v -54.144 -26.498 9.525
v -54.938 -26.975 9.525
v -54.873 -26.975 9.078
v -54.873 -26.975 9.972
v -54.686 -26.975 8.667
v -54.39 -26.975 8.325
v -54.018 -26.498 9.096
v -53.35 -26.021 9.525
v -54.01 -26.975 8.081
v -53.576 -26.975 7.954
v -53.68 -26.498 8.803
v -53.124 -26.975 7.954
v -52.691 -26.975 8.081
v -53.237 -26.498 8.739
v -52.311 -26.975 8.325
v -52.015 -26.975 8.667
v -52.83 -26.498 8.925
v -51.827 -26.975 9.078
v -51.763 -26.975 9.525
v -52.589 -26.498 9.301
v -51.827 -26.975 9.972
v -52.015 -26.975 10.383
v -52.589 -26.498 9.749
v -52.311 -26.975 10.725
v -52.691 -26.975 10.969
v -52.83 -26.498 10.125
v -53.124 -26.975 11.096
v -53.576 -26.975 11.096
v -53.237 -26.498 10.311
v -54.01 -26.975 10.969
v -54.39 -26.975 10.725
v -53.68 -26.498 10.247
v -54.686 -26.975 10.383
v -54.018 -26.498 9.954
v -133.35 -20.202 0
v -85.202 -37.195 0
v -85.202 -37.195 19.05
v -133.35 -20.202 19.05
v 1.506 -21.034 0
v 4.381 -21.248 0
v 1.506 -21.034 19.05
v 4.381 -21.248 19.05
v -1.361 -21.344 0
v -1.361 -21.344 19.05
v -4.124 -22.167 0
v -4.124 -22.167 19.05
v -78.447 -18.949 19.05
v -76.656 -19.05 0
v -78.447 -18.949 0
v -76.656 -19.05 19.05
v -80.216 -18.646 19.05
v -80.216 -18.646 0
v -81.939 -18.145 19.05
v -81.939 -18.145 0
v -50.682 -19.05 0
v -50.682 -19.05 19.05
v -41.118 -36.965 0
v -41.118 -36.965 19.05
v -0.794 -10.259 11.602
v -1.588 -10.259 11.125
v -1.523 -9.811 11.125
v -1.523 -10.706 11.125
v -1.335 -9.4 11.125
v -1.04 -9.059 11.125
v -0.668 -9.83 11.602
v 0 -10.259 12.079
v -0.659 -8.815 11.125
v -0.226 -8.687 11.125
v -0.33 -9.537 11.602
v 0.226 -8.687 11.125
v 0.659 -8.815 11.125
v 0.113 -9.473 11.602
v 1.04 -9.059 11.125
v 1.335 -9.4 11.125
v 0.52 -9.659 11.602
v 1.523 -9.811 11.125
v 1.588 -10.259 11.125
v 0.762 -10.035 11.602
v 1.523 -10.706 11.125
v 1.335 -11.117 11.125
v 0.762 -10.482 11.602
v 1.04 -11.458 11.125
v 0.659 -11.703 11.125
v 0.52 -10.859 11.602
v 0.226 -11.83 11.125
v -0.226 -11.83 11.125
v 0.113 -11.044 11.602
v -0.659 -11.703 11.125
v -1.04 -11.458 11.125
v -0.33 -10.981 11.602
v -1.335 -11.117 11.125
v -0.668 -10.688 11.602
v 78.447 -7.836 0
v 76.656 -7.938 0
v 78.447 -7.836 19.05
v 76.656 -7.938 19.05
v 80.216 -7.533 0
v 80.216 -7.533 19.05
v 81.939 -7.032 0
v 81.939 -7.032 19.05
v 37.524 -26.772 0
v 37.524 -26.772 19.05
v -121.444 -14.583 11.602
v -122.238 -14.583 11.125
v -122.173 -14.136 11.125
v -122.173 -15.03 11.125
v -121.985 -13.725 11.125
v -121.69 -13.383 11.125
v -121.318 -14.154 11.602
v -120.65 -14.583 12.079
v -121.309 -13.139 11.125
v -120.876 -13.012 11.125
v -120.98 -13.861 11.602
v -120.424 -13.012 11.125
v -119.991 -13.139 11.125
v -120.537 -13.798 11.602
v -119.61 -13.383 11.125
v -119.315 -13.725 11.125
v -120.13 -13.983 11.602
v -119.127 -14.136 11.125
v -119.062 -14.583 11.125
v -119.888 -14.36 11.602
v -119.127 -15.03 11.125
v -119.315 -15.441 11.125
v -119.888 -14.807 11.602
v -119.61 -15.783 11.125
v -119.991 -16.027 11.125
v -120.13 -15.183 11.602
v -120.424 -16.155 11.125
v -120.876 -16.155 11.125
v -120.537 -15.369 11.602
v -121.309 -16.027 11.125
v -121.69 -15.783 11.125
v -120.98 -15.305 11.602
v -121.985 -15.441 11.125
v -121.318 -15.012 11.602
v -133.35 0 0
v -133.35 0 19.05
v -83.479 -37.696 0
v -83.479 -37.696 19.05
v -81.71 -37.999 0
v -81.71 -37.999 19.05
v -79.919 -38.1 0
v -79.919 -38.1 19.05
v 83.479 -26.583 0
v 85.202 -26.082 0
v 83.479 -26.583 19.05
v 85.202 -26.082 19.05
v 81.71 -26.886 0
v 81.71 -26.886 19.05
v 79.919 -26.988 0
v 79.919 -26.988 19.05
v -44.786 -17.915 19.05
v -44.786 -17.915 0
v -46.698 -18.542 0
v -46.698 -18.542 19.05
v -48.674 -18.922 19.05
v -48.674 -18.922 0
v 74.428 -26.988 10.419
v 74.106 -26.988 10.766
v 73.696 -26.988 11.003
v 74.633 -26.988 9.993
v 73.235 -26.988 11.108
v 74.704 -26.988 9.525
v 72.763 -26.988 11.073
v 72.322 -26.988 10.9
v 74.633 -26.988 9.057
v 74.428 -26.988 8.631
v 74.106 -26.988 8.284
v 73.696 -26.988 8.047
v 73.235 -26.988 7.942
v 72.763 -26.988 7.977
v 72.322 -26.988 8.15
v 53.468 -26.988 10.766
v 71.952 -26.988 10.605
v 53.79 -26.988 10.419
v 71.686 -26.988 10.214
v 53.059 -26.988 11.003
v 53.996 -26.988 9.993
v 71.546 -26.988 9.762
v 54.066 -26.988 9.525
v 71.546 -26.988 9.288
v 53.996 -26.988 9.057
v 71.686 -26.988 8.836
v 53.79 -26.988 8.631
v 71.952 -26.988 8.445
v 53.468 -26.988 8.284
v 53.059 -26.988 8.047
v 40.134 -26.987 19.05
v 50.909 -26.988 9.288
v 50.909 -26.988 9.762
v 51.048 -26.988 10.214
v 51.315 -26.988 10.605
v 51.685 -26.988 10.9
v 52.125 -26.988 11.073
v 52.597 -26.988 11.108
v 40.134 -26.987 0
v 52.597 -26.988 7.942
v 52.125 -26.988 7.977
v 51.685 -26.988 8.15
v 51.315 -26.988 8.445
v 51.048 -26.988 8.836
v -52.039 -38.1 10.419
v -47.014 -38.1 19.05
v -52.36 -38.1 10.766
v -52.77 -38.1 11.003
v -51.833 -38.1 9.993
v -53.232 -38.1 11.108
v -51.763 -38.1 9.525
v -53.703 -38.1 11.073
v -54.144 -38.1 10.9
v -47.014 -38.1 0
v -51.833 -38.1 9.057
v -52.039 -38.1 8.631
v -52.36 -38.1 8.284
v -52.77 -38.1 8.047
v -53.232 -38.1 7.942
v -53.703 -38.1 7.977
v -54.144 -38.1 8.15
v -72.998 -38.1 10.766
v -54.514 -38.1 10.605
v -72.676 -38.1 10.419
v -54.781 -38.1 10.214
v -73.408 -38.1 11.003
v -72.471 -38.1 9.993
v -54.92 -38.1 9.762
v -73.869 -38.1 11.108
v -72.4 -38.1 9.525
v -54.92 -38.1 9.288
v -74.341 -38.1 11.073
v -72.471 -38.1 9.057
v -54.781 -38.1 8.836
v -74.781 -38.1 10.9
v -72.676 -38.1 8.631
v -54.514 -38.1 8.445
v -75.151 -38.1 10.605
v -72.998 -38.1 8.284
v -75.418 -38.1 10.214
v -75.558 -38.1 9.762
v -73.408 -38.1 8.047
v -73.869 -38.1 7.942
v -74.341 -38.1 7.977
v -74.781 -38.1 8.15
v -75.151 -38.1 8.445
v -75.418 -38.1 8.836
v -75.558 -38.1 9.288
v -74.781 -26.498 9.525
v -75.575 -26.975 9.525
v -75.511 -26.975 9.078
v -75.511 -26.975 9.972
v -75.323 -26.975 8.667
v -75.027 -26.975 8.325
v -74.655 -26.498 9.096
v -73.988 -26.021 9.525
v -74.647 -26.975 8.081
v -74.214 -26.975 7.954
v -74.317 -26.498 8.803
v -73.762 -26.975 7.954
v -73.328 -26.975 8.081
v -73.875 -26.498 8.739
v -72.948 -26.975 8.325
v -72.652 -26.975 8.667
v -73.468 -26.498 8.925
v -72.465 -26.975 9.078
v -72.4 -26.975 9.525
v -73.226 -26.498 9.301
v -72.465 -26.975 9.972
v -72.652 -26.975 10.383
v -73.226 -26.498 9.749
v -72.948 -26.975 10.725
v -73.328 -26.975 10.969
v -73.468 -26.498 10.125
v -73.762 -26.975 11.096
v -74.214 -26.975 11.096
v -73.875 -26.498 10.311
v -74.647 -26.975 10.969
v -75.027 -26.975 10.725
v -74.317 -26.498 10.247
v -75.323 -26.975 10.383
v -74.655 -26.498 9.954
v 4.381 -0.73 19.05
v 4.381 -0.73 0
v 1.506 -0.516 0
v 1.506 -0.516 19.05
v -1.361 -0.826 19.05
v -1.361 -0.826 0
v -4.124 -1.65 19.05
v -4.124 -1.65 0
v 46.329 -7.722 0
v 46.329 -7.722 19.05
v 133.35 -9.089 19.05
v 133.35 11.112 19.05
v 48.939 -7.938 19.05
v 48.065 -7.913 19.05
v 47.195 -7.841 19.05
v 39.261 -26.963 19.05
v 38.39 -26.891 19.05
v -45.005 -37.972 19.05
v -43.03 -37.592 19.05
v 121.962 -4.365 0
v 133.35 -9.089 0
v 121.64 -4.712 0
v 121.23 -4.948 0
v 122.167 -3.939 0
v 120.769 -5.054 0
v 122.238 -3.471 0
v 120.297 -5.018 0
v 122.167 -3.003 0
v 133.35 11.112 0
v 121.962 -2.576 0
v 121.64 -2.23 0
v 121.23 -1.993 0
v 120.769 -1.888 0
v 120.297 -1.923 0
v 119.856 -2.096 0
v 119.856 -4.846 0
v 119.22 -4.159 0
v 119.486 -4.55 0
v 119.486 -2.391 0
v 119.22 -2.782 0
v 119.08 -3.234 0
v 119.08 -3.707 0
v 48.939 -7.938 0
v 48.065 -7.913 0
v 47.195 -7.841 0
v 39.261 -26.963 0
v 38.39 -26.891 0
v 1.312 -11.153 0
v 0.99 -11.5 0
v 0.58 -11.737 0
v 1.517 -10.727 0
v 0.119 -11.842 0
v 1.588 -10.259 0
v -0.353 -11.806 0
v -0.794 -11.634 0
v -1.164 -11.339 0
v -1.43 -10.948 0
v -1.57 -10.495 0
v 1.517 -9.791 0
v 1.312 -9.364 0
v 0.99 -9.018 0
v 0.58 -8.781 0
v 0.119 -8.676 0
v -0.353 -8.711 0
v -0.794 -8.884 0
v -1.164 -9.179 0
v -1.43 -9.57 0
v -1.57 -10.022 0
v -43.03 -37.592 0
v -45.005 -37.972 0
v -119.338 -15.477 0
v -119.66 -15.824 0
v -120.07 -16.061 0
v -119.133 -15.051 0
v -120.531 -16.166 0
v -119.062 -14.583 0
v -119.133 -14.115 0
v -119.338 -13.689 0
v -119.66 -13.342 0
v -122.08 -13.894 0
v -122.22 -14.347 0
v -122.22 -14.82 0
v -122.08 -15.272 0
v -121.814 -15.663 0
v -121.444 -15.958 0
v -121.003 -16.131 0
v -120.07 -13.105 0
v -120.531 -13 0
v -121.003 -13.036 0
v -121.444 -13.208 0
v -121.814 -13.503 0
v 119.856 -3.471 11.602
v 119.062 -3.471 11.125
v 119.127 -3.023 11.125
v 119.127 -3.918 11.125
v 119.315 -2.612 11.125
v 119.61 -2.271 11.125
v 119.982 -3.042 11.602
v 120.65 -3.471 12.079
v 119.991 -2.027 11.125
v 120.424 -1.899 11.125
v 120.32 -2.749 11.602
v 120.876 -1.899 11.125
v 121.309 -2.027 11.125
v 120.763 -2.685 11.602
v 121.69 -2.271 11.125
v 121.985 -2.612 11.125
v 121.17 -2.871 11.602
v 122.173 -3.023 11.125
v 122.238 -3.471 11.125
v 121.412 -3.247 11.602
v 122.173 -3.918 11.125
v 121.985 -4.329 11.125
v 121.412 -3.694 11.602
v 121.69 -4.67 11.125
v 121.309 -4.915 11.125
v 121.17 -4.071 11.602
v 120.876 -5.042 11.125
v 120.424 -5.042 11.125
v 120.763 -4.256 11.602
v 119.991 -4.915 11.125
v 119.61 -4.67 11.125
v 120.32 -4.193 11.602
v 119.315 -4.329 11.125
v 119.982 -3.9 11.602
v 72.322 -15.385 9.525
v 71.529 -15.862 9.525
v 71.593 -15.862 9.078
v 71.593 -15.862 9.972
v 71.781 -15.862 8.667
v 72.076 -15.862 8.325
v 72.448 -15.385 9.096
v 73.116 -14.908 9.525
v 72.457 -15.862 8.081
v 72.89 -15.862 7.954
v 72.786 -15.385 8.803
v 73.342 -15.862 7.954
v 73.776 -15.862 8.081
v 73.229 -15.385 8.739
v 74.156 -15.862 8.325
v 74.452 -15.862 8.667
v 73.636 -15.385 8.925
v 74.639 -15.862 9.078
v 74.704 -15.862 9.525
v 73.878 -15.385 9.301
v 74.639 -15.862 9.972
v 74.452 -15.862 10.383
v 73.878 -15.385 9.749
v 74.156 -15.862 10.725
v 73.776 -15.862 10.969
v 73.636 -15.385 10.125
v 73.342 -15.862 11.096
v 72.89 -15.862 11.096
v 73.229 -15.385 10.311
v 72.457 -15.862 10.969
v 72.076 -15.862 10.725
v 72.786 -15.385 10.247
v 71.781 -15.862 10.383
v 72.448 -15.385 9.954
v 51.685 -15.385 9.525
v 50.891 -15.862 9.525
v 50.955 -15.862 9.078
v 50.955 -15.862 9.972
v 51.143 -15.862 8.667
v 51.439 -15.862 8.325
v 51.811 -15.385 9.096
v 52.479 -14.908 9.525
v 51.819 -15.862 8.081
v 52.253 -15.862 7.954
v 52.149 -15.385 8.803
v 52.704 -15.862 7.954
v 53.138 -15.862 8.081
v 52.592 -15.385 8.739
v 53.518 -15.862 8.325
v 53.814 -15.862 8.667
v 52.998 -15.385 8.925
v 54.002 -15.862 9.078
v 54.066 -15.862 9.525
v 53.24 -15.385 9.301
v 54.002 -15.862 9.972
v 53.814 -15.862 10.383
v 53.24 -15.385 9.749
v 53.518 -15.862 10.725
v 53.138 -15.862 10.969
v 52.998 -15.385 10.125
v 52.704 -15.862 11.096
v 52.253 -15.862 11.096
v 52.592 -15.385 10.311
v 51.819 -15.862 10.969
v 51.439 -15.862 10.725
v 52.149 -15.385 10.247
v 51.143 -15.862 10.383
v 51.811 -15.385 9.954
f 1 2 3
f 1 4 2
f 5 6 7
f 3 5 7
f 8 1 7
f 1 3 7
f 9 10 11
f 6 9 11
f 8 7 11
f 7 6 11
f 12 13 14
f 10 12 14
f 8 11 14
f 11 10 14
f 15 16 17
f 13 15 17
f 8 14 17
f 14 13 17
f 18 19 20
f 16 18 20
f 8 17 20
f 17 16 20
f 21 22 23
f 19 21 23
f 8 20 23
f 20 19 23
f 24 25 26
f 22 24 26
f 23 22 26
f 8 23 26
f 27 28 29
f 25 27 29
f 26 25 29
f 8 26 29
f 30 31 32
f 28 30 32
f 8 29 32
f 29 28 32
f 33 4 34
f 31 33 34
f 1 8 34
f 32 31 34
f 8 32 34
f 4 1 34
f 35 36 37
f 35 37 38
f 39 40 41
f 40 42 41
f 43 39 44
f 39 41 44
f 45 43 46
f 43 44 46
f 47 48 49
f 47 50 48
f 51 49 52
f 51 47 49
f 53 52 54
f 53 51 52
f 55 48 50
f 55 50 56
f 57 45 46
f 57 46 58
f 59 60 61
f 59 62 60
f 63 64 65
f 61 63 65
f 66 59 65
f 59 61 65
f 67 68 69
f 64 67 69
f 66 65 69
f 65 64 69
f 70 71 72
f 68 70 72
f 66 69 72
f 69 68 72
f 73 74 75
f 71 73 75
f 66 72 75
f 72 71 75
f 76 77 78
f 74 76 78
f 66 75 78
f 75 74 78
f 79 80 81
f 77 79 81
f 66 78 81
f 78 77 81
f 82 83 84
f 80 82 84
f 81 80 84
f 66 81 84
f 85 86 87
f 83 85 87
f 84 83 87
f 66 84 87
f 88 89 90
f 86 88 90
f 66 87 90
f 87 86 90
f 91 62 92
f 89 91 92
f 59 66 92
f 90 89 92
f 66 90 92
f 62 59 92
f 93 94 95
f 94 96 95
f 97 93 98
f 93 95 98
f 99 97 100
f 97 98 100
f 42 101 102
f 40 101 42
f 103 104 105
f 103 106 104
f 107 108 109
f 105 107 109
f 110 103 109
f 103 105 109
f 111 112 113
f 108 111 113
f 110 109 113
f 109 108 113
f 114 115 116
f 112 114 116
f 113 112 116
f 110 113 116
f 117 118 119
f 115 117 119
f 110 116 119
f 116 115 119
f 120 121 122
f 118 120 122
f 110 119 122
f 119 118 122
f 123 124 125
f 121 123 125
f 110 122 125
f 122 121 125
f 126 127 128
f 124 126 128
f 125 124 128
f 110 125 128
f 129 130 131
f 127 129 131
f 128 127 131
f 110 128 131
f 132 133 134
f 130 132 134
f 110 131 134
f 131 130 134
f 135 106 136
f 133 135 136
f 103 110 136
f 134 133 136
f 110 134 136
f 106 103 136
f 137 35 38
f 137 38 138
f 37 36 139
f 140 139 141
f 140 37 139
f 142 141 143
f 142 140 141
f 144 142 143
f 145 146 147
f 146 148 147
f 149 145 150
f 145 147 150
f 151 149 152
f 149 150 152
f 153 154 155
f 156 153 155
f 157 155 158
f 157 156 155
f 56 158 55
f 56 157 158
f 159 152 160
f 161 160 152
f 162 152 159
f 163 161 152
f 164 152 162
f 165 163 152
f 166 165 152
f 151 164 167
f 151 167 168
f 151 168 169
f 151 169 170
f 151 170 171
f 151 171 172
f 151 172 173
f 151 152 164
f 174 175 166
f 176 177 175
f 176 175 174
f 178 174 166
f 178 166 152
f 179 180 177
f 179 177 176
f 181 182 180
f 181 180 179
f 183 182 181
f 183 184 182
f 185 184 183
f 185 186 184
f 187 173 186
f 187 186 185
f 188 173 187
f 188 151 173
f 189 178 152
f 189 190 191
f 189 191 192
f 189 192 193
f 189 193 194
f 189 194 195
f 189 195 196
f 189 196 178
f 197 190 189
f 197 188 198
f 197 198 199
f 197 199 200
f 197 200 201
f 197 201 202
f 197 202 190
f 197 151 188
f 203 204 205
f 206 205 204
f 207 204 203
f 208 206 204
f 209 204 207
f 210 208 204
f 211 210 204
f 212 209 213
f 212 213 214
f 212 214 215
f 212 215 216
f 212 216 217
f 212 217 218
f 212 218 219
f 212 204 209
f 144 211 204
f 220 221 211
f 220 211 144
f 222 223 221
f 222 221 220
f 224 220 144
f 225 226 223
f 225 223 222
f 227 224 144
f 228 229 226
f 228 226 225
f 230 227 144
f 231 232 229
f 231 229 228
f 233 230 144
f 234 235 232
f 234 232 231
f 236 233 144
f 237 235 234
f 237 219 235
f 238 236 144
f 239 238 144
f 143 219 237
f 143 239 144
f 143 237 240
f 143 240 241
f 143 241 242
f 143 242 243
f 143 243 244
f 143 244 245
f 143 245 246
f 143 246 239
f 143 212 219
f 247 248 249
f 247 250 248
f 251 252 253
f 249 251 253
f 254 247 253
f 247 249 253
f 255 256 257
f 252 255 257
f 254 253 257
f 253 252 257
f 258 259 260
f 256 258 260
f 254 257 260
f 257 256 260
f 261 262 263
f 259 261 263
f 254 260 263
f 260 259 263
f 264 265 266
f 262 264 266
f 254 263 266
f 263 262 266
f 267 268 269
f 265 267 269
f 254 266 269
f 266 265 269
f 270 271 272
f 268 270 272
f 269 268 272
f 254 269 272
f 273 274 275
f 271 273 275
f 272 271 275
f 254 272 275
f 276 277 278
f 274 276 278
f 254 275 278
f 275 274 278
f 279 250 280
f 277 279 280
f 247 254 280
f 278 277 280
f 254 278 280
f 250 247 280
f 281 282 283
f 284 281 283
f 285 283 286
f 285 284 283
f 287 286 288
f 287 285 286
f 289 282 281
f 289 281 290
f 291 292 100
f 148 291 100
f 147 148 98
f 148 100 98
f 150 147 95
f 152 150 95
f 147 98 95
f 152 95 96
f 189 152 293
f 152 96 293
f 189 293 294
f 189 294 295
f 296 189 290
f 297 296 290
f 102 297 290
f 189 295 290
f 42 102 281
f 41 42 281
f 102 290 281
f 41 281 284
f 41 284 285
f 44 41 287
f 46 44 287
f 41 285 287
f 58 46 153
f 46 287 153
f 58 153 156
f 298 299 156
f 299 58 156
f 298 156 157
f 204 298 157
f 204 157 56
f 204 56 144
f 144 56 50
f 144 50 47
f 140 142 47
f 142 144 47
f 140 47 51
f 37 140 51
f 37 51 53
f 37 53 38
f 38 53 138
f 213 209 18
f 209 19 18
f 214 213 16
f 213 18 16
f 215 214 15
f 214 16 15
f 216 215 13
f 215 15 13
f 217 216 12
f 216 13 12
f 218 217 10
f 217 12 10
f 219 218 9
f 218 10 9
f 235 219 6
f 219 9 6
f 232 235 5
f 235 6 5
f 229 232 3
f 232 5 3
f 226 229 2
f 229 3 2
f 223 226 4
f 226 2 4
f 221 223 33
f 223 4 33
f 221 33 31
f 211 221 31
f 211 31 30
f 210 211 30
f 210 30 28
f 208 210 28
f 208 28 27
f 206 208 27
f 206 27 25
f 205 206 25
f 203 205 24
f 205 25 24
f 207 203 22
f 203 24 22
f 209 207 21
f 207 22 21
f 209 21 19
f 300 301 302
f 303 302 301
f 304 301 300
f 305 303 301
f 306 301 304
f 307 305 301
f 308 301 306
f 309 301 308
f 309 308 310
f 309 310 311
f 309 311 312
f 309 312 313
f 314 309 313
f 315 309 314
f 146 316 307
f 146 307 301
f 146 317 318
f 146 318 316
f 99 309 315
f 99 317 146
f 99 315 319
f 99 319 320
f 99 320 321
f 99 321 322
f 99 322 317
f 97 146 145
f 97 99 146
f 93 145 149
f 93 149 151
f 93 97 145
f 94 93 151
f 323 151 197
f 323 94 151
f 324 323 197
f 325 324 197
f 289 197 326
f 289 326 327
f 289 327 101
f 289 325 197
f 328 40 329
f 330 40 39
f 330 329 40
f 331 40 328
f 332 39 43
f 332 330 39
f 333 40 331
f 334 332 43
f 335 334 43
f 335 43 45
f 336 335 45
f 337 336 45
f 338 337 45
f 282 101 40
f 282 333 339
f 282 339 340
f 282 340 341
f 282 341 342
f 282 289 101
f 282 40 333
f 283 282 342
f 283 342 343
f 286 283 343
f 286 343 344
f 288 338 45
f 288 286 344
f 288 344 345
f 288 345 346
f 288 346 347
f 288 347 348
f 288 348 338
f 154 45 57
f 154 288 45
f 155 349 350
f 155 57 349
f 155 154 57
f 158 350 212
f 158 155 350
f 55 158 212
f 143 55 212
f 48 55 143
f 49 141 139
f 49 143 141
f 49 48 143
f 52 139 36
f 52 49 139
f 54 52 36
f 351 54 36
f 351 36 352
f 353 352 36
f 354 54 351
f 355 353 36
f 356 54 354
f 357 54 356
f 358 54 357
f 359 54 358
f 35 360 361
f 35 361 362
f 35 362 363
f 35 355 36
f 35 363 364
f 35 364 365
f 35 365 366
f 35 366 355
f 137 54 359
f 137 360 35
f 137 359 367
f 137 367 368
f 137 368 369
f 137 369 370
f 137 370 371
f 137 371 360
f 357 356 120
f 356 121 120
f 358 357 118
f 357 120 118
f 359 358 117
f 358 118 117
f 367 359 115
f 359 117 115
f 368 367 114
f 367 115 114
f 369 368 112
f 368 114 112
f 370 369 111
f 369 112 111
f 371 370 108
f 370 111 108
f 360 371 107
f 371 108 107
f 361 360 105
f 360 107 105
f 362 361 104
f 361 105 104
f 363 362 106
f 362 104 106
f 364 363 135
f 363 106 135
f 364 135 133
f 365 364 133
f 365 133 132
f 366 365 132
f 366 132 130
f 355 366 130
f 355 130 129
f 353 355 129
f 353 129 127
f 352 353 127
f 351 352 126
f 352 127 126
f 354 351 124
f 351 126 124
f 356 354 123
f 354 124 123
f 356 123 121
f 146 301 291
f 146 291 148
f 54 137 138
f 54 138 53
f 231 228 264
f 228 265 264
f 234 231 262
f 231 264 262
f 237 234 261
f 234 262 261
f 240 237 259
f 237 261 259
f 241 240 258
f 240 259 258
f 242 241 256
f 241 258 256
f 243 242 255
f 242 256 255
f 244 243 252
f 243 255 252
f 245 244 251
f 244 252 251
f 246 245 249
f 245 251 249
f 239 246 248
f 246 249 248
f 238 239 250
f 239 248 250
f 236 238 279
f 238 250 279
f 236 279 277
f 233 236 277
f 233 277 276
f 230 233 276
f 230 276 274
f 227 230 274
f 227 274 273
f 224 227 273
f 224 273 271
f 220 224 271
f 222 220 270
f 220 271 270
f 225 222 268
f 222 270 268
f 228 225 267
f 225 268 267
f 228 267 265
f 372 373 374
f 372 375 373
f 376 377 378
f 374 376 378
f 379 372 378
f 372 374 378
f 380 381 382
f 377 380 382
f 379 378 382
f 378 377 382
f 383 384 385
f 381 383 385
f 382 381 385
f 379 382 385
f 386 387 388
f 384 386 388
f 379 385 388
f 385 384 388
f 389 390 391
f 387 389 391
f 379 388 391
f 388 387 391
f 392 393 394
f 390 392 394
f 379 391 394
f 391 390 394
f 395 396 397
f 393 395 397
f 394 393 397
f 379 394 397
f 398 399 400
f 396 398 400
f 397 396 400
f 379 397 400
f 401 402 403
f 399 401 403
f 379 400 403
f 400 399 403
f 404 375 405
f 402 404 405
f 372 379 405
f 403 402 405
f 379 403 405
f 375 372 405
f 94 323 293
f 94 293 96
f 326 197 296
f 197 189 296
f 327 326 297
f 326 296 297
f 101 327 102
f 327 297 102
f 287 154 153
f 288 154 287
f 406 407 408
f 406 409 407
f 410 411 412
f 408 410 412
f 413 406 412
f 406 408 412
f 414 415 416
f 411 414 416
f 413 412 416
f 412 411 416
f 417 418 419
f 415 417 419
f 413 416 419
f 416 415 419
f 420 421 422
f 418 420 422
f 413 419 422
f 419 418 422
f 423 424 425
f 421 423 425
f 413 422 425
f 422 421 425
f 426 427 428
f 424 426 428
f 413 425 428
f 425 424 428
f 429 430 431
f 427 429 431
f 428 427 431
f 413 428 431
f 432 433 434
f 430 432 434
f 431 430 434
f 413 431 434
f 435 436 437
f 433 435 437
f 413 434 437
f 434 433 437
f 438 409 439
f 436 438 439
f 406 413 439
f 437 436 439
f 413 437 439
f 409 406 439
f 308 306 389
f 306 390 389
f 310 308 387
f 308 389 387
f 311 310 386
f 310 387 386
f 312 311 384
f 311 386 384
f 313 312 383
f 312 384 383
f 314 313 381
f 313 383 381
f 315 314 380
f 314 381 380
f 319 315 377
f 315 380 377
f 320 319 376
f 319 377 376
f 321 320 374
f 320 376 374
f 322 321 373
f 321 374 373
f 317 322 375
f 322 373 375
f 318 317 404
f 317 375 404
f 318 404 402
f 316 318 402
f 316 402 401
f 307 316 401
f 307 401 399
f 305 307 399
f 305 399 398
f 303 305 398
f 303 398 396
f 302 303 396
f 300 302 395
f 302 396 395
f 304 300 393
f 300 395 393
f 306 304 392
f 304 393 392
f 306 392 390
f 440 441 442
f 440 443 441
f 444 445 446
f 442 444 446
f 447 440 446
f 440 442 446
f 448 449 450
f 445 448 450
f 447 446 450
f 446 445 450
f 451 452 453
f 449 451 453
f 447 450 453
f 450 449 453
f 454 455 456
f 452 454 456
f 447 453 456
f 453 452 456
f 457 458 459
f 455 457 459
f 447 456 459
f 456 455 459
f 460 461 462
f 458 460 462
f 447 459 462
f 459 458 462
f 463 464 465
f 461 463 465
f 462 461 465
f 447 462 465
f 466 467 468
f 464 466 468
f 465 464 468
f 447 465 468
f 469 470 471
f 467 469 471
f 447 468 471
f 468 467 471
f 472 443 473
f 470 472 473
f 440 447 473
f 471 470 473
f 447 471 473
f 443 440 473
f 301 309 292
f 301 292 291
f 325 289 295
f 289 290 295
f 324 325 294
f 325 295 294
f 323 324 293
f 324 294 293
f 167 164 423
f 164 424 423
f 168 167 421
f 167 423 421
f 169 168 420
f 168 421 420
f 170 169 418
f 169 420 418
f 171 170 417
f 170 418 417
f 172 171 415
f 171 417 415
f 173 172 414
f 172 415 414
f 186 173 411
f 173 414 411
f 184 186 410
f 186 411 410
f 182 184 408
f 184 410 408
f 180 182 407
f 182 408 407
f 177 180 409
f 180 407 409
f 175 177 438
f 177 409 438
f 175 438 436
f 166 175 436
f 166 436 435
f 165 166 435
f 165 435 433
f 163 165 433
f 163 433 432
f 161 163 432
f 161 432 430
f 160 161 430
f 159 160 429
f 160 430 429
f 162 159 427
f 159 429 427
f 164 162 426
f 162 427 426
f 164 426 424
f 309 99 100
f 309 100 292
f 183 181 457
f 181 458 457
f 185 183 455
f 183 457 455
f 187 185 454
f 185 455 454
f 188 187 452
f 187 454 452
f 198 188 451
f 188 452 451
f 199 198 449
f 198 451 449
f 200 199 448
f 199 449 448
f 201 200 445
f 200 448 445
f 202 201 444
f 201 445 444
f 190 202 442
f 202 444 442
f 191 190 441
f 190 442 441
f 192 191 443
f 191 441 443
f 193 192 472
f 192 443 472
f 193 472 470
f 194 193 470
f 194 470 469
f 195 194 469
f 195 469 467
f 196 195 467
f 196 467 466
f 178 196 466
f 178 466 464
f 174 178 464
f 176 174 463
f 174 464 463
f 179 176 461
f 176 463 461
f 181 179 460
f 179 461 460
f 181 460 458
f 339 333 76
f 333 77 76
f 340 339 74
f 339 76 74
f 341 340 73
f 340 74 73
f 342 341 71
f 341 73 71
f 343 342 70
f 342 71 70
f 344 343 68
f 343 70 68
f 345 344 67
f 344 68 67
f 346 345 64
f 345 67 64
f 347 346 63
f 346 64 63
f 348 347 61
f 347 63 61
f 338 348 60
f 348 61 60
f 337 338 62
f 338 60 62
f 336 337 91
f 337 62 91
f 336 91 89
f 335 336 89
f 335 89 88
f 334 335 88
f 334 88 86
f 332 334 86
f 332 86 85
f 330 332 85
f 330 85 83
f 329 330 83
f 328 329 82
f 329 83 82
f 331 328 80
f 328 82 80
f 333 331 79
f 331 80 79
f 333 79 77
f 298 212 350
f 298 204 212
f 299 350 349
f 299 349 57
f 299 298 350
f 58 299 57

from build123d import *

# Parameters (mm, degrees)
BOSS_EXTRUDE1_DEPTH              = 19.05
F_1_8_0_125_DIAMETER_HOLE1_D     = 3.175
F_1_8_0_125_DIAMETER_HOLE1_DEPTH = 11.1252
F_1_8_0_125_DIAMETER_HOLE1_TIP   = 0.953866233
FILLET1_R                        = 15.875
F_1_8_0_125_DIAMETER_HOLE2_D     = 3.175
F_1_8_0_125_DIAMETER_HOLE2_DEPTH = 11.1252
F_1_8_0_125_DIAMETER_HOLE2_TIP   = 0.953866233
F_1_8_0_125_DIAMETER_HOLE3_D     = 3.175
F_1_8_0_125_DIAMETER_HOLE3_DEPTH = 11.1252
F_1_8_0_125_DIAMETER_HOLE3_TIP   = 0.953866233


with BuildPart() as part:
    # Sketch1 → Boss-Extrude1 (new body)
    with BuildSketch(Plane.XY):
        Polygon((0, 0), (47.625, -7.9375), (79.375, -7.9375), (133.35, 11.1125), (133.35, -9.089191705), (82.638126498, -26.9875), (38.820132509, -26.9875), (0, -20.517477915), (-43.956305212, -38.1), (-82.638126498, -38.1), (-133.35, -20.201691705), (-133.35, 0), (-79.375, -19.05), (-47.625, -19.05), align=None)
    extrude(amount=BOSS_EXTRUDE1_DEPTH)

    # 1/8 (0.125) Diameter Hole1
    with Locations(Plane(origin=(0, 0, 0), x_dir=(-1, 0, 0), z_dir=(0, 0, -1))):
        with Locations((-120.65, -3.470698794), (0, -10.258738958), (120.65, -14.583198794)):
            Hole(F_1_8_0_125_DIAMETER_HOLE1_D / 2, depth=F_1_8_0_125_DIAMETER_HOLE1_DEPTH)
            with Locations((0, 0, -(F_1_8_0_125_DIAMETER_HOLE1_DEPTH + F_1_8_0_125_DIAMETER_HOLE1_TIP / 2))):  # 118° drill point
                Cone(0, F_1_8_0_125_DIAMETER_HOLE1_D / 2, F_1_8_0_125_DIAMETER_HOLE1_TIP, mode=Mode.SUBTRACT)

    # Fillet1
    fillet1_edges = [part.edges().sort_by_distance(p)[0] for p in [
        (0, 0, 9.525),
        (47.625, -7.9375, 9.525),
        (79.375, -7.9375, 9.525),
        (82.638126498, -26.9875, 9.525),
        (38.820132509, -26.9875, 9.525),
        (0, -20.517477915, 9.525),
        (-43.956305212, -38.1, 9.525),
        (-82.638126498, -38.1, 9.525),
        (-79.375, -19.05, 9.525),
        (-47.625, -19.05, 9.525),
    ]]
    fillet(fillet1_edges, radius=FILLET1_R)

    # 1/8 (0.125) Diameter Hole2
    with Locations(Plane(origin=(0, -26.9875, 0), x_dir=(-1, 0, 0), z_dir=(0, -1, 0))):
        with Locations((-73.116041543, -9.525), (-52.478541543, -9.525)):
            Hole(F_1_8_0_125_DIAMETER_HOLE2_D / 2, depth=F_1_8_0_125_DIAMETER_HOLE2_DEPTH)
            with Locations((0, 0, -(F_1_8_0_125_DIAMETER_HOLE2_DEPTH + F_1_8_0_125_DIAMETER_HOLE2_TIP / 2))):  # 118° drill point
                Cone(0, F_1_8_0_125_DIAMETER_HOLE2_D / 2, F_1_8_0_125_DIAMETER_HOLE2_TIP, mode=Mode.SUBTRACT)

    # 1/8 (0.125) Diameter Hole3
    with Locations(Plane(origin=(0, -38.1, 0), x_dir=(-1, 0, 0), z_dir=(0, -1, 0))):
        with Locations((53.350236787, -9.525), (73.987736787, -9.525)):
            Hole(F_1_8_0_125_DIAMETER_HOLE3_D / 2, depth=F_1_8_0_125_DIAMETER_HOLE3_DEPTH)
            with Locations((0, 0, -(F_1_8_0_125_DIAMETER_HOLE3_DEPTH + F_1_8_0_125_DIAMETER_HOLE3_TIP / 2))):  # 118° drill point
                Cone(0, F_1_8_0_125_DIAMETER_HOLE3_D / 2, F_1_8_0_125_DIAMETER_HOLE3_TIP, mode=Mode.SUBTRACT)


solid = part.part
